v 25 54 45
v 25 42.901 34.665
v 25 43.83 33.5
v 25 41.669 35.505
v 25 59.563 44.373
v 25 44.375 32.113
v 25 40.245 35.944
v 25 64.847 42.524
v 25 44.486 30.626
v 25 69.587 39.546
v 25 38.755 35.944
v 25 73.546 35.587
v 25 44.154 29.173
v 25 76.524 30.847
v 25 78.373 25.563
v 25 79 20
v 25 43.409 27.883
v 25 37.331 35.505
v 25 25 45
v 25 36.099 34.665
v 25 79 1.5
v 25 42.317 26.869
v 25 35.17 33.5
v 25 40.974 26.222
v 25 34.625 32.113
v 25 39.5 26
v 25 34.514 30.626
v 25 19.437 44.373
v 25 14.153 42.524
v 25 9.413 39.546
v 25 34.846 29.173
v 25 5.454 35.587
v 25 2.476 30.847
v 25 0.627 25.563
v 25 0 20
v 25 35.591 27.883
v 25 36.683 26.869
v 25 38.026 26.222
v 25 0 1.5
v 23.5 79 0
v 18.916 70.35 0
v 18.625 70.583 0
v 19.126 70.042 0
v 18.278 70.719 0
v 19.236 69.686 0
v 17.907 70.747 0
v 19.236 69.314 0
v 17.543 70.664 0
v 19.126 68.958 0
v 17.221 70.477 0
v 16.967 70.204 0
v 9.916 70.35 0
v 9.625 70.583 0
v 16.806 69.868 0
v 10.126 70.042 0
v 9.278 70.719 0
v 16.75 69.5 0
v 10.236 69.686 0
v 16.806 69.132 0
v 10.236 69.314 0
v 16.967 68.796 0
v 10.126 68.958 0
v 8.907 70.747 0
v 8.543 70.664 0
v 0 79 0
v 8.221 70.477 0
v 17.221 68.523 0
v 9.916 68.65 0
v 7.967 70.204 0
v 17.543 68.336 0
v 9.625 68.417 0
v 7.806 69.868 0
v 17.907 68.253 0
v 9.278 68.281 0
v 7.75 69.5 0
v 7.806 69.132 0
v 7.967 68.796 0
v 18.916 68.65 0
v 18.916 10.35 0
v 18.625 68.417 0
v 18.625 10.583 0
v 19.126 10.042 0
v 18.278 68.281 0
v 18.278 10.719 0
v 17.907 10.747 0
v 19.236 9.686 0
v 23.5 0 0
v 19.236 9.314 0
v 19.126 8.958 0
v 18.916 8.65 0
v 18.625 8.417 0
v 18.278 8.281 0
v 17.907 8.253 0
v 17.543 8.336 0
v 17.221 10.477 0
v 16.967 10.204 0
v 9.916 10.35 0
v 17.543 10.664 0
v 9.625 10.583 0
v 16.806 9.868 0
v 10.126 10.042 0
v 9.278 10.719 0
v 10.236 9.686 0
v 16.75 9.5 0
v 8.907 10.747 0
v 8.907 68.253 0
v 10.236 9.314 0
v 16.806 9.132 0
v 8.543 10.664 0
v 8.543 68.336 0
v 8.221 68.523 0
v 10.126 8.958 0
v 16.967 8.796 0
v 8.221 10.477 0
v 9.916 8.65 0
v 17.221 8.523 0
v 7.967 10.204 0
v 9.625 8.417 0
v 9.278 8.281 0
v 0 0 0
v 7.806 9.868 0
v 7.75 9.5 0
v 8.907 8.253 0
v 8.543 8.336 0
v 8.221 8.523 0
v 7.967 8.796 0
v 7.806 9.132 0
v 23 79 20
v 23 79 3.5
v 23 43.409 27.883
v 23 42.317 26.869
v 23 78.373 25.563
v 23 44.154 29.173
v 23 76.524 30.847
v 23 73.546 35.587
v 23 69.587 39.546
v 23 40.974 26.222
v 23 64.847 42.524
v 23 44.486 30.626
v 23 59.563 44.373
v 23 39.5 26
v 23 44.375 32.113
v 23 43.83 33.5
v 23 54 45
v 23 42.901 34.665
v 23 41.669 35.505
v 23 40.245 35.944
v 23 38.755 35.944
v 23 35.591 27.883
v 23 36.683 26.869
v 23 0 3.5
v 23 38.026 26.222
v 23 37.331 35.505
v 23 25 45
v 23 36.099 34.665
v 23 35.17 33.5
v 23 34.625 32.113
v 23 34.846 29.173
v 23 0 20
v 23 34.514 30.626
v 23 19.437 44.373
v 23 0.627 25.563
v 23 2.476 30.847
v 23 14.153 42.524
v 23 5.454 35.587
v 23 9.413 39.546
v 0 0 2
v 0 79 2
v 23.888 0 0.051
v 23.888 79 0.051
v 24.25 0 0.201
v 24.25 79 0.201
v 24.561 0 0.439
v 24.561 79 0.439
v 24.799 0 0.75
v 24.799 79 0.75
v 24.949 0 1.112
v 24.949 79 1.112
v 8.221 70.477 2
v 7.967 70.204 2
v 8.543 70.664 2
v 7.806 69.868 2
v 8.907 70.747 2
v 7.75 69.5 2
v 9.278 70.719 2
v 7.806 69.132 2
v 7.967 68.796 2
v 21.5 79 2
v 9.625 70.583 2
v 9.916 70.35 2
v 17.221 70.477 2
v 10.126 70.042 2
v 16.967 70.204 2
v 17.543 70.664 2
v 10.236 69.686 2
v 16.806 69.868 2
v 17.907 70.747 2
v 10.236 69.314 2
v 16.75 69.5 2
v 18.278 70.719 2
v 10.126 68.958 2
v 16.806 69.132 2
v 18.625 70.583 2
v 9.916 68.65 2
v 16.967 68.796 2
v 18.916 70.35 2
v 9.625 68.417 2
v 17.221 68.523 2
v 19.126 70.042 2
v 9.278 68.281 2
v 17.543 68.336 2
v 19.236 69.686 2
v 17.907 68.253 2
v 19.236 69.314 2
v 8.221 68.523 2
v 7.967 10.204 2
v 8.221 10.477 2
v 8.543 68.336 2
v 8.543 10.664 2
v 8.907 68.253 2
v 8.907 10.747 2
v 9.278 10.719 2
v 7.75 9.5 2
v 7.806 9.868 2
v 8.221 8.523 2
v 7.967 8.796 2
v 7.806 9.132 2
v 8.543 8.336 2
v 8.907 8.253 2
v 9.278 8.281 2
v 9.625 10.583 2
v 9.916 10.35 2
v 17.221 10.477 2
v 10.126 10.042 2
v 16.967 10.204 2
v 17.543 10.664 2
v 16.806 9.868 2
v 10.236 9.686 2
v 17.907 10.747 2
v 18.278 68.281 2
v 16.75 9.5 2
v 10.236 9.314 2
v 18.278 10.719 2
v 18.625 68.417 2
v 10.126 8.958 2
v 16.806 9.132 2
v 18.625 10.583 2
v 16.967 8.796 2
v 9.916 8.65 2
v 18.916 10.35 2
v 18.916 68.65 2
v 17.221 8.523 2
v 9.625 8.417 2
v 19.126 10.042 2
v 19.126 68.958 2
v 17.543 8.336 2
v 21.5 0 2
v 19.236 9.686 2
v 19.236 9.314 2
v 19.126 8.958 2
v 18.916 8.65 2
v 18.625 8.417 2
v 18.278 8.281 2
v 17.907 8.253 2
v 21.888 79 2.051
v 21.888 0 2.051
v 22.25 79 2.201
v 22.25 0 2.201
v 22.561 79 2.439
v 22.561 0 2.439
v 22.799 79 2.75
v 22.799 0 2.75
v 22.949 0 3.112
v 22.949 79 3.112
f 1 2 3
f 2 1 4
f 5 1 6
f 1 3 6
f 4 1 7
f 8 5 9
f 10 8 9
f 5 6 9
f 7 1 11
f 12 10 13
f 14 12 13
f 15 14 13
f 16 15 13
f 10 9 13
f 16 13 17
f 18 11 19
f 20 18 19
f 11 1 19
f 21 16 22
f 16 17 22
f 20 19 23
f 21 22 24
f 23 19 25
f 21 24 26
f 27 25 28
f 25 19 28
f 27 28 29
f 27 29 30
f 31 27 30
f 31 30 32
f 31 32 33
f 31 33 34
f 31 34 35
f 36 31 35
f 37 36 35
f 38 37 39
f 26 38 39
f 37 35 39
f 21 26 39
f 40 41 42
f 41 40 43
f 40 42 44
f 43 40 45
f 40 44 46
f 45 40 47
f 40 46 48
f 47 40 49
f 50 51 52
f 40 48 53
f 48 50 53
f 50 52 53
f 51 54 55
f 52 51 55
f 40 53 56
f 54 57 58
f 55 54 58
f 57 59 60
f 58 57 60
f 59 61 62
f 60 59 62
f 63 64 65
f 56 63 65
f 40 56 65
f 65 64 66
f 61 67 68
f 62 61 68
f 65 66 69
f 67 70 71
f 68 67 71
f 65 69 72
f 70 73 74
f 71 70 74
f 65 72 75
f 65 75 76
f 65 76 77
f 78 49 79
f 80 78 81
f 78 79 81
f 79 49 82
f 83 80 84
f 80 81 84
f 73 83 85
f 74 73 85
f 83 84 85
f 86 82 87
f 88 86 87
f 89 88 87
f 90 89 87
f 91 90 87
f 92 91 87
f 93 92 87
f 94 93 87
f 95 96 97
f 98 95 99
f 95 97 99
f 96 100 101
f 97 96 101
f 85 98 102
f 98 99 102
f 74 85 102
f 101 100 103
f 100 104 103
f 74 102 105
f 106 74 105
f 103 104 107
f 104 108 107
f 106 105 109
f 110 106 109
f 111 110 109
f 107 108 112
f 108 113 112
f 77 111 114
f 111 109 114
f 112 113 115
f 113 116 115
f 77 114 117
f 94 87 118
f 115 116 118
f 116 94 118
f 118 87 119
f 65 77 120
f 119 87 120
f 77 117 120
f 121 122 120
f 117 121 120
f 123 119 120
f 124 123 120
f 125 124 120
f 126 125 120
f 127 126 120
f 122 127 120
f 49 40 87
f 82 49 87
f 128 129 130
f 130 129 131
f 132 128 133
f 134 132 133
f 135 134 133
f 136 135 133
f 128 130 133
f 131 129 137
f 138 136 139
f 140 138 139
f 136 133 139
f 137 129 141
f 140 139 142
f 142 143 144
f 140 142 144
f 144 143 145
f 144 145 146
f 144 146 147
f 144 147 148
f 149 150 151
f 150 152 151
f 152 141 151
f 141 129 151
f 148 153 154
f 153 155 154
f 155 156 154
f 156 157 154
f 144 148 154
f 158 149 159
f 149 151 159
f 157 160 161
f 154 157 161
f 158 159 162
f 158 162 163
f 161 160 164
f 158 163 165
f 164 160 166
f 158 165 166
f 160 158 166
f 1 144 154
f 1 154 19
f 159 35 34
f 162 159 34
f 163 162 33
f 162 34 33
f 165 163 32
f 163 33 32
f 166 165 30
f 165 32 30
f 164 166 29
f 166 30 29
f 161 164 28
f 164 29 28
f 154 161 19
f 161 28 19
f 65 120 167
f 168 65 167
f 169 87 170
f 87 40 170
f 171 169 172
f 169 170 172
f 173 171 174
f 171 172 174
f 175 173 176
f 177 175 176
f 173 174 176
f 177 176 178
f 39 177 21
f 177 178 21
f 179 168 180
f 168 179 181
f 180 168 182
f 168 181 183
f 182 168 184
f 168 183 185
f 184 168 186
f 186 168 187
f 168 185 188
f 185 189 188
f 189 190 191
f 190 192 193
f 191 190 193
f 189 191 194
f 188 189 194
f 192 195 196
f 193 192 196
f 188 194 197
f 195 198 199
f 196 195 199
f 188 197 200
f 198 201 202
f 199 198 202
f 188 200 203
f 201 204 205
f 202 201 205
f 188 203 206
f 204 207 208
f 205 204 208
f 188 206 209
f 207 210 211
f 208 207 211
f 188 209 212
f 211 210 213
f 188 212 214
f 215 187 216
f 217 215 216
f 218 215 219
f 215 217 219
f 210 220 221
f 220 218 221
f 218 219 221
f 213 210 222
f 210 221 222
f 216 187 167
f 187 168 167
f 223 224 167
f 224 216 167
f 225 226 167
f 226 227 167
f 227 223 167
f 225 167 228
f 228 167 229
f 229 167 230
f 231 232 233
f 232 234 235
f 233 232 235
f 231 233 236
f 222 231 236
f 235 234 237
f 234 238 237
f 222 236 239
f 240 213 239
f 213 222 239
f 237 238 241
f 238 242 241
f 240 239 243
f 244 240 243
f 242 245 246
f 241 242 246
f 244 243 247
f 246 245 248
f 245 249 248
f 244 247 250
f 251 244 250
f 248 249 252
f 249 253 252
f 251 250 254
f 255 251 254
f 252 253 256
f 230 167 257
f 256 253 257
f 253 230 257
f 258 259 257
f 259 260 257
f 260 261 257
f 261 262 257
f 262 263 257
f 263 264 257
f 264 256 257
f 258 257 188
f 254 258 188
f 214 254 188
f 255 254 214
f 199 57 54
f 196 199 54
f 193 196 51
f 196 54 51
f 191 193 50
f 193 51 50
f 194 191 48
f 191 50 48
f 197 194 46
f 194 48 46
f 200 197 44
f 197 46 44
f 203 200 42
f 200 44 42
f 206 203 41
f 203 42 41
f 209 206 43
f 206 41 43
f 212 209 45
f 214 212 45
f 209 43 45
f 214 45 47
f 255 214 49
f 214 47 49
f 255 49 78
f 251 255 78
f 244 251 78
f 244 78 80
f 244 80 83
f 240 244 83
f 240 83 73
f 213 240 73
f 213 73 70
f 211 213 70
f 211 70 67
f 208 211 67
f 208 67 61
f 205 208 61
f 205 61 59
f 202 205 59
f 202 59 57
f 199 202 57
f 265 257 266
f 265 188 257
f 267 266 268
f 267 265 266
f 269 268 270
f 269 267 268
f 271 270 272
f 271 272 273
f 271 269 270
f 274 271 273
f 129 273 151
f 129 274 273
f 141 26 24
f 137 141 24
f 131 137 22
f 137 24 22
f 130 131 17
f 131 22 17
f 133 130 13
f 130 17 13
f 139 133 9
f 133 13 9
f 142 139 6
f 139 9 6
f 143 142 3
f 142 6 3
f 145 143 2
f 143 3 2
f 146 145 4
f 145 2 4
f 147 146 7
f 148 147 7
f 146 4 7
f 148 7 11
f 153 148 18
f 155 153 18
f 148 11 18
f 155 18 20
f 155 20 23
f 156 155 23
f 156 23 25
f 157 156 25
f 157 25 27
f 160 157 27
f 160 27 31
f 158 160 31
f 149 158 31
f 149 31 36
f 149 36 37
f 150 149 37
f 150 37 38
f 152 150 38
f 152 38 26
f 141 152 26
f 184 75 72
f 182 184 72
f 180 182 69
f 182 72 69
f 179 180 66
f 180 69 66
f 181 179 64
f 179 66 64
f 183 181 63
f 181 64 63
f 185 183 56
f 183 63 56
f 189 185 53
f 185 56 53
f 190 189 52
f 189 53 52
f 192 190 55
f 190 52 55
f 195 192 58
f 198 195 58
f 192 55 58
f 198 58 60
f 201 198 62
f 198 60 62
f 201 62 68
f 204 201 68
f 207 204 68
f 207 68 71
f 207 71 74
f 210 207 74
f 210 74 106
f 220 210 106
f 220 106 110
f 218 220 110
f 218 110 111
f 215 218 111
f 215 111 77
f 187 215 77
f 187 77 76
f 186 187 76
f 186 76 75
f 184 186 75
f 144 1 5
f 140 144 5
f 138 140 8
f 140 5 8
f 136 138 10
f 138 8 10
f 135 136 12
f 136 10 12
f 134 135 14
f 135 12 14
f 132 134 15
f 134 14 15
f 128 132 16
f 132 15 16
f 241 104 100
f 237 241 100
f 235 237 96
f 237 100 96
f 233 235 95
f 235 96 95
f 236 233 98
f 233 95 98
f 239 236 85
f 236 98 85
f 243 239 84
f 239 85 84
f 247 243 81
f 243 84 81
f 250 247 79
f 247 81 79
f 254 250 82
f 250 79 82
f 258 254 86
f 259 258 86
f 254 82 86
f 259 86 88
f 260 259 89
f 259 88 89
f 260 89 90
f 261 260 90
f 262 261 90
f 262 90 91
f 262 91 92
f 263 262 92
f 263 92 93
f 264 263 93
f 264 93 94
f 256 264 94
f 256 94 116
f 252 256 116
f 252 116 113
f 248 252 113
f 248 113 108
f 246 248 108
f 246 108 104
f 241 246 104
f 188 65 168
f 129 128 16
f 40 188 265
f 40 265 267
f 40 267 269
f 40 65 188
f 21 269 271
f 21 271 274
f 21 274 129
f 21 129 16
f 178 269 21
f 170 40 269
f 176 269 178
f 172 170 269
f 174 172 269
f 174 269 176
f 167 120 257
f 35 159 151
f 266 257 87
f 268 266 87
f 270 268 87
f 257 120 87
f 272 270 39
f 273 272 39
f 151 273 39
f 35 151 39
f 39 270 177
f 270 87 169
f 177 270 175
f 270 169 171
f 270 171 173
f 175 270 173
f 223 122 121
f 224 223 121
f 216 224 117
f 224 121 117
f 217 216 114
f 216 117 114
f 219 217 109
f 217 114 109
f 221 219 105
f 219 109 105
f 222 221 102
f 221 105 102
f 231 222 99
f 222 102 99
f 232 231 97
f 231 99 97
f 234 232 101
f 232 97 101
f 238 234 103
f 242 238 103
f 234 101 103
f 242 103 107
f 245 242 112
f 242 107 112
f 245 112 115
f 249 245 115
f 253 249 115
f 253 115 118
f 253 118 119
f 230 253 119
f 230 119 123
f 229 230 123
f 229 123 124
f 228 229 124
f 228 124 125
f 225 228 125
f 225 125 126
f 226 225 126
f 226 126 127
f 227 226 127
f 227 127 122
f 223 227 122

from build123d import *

# Parameters (mm, degrees)
BOSS_EXTRUDE1_DEPTH = 79
SKETCH2_R           = 5
CUT_EXTRUDE1_DEPTH  = 95.292099351
CUT_EXTRUDE3_DEPTH  = 95.292099351
FILLET1_R           = 1.5
SKETCH5_R           = 1.25
CUT_EXTRUDE4_DEPTH  = 95.292099351


with BuildPart() as part:
    # Sketch1 → Boss-Extrude1 (new body)
    with BuildSketch(Plane(origin=(0, 0, 0), x_dir=(1, 0, 0), z_dir=(0, 1, 0))):
        Polygon((0, 0), (0, -2), (23, -2), (23, -45), (25, -45), (25, 0), align=None)
    extrude(amount=BOSS_EXTRUDE1_DEPTH)

    # Sketch2 → Cut-Extrude1 (cut, through all)
    with BuildSketch(Plane(origin=(25, 0, 0), x_dir=(0, 0, -1), z_dir=(1, 0, 0))):
        with Locations((-31, 39.5)):
            Circle(SKETCH2_R)
    extrude(amount=-CUT_EXTRUDE1_DEPTH, mode=Mode.SUBTRACT)

    # Sketch3 → Cut-Extrude3 (cut, through all)
    with BuildSketch(Plane(origin=(25, 0, 0), x_dir=(0, 0, -1), z_dir=(1, 0, 0))):
        Polygon((-56.02971798, 54), (-45, 54), (-45, 79), (-20, 79), (-20, 83.569029918), (-56.02971798, 83.569029918), align=None)
        Polygon((-45, 0), (-45, 25), (-50.640365422, 25), (-50.640365422, -10.402653787), (-20, -10.402653787), (-20, 0), align=None)
        with BuildLine():
            ThreePointArc((-20, 0), (-37.67766953, 7.32233047), (-45, 25))
            Line((-45, 25), (-45, 0))
            Line((-45, 0), (-20, 0))
        make_face()
        with BuildLine():
            Line((-45, 79), (-45, 54))
            ThreePointArc((-45, 54), (-37.67766953, 71.67766953), (-20, 79))
            Line((-20, 79), (-45, 79))
        make_face()
    extrude(amount=-CUT_EXTRUDE3_DEPTH, mode=Mode.SUBTRACT)

    # Fillet1
    fillet1_edges = [part.edges().sort_by_distance(p)[0] for p in [
        (25, 39.5, 0),
        (23, 39.5, 2),
    ]]
    fillet(fillet1_edges, radius=FILLET1_R)

    # Sketch5 → Cut-Extrude4 (cut, through all)
    with BuildSketch(Plane(origin=(0, 0, 0), x_dir=(-1, 0, 0), z_dir=(0, 0, -1))):
        with Locations((-18, 69.5)):
            Circle(SKETCH5_R)
        with Locations((-9, 69.5)):
            Circle(SKETCH5_R)
        with Locations((-9, 9.5)):
            Circle(SKETCH5_R)
        with Locations((-18, 9.5)):
            Circle(SKETCH5_R)
    extrude(amount=-CUT_EXTRUDE4_DEPTH, mode=Mode.SUBTRACT)


solid = part.part
